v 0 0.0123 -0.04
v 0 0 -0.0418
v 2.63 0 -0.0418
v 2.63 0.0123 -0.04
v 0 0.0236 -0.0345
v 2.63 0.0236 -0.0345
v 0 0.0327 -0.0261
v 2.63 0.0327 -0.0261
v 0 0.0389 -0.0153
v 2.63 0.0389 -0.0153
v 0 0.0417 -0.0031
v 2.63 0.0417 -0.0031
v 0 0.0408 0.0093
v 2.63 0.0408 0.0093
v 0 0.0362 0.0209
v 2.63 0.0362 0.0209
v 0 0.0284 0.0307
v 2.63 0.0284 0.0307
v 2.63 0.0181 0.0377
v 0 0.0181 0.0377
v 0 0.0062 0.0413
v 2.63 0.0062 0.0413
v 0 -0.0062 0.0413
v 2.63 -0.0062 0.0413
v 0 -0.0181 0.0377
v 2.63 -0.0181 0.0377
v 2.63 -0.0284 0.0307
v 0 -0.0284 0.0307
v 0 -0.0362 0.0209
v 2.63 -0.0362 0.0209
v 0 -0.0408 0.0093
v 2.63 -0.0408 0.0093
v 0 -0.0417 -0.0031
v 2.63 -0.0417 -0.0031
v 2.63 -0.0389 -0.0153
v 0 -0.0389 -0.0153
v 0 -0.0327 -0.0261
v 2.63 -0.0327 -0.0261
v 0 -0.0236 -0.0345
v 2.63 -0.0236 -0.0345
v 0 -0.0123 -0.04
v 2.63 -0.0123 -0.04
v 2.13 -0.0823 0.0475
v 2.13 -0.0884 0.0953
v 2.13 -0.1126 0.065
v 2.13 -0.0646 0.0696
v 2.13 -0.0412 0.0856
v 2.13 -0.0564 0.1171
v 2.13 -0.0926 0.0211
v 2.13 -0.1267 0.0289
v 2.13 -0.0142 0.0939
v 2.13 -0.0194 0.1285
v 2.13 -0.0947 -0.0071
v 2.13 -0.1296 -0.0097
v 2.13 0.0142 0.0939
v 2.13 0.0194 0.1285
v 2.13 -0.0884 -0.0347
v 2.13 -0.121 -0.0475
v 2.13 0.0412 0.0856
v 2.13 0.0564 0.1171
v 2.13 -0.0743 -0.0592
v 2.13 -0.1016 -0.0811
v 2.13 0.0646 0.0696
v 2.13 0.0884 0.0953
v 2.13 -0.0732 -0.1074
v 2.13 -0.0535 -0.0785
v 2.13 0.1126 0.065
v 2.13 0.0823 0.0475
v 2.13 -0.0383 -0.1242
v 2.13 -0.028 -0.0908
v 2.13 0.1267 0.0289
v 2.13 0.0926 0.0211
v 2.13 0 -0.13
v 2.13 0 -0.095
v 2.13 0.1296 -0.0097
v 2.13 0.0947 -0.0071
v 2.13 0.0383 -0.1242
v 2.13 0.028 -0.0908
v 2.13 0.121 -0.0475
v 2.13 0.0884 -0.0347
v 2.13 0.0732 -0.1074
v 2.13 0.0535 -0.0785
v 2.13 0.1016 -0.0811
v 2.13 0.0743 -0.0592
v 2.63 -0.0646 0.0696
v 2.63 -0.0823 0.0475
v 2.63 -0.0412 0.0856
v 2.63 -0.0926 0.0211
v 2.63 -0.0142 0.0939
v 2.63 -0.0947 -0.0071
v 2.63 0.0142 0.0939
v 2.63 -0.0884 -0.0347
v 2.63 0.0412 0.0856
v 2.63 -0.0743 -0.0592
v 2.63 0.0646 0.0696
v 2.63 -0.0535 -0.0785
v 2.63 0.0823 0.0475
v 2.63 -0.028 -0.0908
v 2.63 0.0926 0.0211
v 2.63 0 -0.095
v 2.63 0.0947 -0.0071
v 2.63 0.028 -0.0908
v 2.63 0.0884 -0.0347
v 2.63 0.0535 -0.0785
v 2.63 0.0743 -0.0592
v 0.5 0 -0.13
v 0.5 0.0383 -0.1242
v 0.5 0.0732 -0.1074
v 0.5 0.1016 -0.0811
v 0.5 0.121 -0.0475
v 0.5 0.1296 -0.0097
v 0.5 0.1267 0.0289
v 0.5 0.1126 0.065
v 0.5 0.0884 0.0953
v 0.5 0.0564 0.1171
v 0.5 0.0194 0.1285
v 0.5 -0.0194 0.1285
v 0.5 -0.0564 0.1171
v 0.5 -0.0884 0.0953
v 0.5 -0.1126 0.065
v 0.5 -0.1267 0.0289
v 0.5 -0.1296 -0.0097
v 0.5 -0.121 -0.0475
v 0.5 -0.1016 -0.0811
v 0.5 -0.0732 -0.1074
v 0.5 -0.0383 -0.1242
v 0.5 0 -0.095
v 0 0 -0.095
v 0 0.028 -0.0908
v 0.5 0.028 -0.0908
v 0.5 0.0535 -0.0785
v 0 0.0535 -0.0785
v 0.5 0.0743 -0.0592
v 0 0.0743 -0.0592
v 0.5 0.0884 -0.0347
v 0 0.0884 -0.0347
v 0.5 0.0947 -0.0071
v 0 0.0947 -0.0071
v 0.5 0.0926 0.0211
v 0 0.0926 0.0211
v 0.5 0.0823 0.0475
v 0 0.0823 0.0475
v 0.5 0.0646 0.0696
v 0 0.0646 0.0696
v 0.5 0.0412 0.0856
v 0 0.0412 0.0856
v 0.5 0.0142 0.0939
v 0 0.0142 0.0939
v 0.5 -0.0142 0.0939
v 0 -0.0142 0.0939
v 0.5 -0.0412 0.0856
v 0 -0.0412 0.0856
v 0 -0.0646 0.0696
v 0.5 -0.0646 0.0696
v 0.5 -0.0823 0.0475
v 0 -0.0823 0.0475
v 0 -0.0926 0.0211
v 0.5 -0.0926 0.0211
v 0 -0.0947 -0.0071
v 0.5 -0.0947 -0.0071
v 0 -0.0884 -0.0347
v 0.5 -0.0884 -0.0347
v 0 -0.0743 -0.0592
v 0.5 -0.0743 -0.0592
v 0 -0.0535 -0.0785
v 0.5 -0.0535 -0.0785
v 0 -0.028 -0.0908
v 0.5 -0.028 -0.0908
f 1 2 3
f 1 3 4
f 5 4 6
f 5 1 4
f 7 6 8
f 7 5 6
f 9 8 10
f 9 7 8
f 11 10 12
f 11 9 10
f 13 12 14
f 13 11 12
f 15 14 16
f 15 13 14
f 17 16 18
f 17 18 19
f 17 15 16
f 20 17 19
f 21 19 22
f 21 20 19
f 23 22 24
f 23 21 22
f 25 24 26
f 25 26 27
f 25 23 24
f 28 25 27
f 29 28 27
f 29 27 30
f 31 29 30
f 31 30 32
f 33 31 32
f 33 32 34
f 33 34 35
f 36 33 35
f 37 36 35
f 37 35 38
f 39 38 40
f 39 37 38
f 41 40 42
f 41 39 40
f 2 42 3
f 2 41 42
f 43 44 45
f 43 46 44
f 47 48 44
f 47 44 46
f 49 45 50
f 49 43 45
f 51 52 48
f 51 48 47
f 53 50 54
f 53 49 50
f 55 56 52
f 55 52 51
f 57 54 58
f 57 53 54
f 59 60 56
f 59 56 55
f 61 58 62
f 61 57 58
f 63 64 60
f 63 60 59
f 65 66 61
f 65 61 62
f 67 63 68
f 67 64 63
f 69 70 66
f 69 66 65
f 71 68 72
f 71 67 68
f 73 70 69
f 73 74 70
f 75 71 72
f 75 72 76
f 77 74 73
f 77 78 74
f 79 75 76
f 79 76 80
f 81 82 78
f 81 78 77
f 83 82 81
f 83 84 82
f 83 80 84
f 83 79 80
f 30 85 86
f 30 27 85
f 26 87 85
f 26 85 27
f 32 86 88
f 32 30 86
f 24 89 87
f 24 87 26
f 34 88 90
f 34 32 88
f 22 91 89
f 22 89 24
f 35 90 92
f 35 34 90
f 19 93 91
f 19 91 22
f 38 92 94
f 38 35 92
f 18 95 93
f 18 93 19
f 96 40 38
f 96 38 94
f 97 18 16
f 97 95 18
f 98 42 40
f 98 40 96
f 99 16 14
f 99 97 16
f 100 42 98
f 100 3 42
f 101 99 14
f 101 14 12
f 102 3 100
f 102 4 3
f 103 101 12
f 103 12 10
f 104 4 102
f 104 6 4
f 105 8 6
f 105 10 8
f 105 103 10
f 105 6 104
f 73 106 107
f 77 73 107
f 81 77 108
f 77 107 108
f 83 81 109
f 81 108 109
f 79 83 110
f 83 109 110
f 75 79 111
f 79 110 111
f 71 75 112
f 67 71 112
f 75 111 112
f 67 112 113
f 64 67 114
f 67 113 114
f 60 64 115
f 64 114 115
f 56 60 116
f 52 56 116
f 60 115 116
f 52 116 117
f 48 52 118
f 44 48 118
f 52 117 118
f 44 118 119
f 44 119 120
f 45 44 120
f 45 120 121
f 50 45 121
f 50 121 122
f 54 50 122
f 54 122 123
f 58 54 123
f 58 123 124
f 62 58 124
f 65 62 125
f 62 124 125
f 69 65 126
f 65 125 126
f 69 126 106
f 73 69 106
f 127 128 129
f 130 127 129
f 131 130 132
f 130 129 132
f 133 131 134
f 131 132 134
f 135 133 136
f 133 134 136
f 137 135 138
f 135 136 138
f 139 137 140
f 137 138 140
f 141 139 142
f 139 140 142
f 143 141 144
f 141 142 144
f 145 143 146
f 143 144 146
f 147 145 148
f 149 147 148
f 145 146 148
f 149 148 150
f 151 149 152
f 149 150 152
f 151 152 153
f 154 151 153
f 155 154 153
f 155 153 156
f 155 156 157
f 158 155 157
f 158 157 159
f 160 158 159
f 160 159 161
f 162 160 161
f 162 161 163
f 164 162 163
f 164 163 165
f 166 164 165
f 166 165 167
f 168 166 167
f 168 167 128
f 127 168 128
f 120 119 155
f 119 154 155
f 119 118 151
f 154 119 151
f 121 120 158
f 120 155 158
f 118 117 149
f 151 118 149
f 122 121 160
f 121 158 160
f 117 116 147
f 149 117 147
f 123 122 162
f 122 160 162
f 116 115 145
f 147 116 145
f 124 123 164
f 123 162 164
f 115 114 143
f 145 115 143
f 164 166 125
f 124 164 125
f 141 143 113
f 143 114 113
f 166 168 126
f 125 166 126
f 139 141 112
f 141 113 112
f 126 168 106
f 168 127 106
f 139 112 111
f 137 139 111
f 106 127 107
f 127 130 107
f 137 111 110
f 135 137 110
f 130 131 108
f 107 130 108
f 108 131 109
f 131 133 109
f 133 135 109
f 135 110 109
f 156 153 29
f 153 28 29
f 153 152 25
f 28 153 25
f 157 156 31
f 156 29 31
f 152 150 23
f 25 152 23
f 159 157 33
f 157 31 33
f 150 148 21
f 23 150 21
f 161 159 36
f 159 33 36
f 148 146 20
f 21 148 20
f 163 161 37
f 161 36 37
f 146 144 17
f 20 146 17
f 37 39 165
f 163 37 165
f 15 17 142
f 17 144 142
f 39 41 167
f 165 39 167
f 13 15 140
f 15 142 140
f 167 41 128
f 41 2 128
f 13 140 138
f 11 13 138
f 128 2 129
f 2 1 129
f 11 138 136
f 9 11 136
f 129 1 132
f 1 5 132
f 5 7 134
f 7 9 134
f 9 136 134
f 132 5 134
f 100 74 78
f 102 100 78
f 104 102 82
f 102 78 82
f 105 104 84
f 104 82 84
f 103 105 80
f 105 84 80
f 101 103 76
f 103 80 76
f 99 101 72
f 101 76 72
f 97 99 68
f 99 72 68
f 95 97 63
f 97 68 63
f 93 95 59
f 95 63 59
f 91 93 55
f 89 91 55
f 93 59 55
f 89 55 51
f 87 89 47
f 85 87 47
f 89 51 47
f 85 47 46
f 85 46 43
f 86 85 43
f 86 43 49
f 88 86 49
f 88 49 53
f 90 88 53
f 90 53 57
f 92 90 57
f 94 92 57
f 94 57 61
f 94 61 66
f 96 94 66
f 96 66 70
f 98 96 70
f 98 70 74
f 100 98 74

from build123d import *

# Parameters (mm, degrees)
SKETCH2_R           = 0.095
SKETCH2_R_2         = 0.041812836
BOSS_EXTRUDE1_DEPTH = 2.63
BOSS_EXTRUDE2_START = 0.5
SKETCH2_3_R         = 0.13
SKETCH2_3_R_2       = 0.095
BOSS_EXTRUDE2_DEPTH = 1.63


with BuildPart() as part:
    # Sketch2 → Boss-Extrude1 (new body)
    with BuildSketch(Plane(origin=(0, 0, 0), x_dir=(0, 0, -1), z_dir=(1, 0, 0))):
        Circle(SKETCH2_R)
        Circle(SKETCH2_R_2, mode=Mode.SUBTRACT)
    extrude(amount=BOSS_EXTRUDE1_DEPTH)

    # Sketch2<3> → Boss-Extrude2 (add)
    with BuildSketch(Plane(origin=(0, 0, 0), x_dir=(0, 0, -1), z_dir=(1, 0, 0)).offset(BOSS_EXTRUDE2_START)):
        Circle(SKETCH2_3_R)
        Circle(SKETCH2_3_R_2, mode=Mode.SUBTRACT)
    extrude(amount=BOSS_EXTRUDE2_DEPTH)


solid = part.part
